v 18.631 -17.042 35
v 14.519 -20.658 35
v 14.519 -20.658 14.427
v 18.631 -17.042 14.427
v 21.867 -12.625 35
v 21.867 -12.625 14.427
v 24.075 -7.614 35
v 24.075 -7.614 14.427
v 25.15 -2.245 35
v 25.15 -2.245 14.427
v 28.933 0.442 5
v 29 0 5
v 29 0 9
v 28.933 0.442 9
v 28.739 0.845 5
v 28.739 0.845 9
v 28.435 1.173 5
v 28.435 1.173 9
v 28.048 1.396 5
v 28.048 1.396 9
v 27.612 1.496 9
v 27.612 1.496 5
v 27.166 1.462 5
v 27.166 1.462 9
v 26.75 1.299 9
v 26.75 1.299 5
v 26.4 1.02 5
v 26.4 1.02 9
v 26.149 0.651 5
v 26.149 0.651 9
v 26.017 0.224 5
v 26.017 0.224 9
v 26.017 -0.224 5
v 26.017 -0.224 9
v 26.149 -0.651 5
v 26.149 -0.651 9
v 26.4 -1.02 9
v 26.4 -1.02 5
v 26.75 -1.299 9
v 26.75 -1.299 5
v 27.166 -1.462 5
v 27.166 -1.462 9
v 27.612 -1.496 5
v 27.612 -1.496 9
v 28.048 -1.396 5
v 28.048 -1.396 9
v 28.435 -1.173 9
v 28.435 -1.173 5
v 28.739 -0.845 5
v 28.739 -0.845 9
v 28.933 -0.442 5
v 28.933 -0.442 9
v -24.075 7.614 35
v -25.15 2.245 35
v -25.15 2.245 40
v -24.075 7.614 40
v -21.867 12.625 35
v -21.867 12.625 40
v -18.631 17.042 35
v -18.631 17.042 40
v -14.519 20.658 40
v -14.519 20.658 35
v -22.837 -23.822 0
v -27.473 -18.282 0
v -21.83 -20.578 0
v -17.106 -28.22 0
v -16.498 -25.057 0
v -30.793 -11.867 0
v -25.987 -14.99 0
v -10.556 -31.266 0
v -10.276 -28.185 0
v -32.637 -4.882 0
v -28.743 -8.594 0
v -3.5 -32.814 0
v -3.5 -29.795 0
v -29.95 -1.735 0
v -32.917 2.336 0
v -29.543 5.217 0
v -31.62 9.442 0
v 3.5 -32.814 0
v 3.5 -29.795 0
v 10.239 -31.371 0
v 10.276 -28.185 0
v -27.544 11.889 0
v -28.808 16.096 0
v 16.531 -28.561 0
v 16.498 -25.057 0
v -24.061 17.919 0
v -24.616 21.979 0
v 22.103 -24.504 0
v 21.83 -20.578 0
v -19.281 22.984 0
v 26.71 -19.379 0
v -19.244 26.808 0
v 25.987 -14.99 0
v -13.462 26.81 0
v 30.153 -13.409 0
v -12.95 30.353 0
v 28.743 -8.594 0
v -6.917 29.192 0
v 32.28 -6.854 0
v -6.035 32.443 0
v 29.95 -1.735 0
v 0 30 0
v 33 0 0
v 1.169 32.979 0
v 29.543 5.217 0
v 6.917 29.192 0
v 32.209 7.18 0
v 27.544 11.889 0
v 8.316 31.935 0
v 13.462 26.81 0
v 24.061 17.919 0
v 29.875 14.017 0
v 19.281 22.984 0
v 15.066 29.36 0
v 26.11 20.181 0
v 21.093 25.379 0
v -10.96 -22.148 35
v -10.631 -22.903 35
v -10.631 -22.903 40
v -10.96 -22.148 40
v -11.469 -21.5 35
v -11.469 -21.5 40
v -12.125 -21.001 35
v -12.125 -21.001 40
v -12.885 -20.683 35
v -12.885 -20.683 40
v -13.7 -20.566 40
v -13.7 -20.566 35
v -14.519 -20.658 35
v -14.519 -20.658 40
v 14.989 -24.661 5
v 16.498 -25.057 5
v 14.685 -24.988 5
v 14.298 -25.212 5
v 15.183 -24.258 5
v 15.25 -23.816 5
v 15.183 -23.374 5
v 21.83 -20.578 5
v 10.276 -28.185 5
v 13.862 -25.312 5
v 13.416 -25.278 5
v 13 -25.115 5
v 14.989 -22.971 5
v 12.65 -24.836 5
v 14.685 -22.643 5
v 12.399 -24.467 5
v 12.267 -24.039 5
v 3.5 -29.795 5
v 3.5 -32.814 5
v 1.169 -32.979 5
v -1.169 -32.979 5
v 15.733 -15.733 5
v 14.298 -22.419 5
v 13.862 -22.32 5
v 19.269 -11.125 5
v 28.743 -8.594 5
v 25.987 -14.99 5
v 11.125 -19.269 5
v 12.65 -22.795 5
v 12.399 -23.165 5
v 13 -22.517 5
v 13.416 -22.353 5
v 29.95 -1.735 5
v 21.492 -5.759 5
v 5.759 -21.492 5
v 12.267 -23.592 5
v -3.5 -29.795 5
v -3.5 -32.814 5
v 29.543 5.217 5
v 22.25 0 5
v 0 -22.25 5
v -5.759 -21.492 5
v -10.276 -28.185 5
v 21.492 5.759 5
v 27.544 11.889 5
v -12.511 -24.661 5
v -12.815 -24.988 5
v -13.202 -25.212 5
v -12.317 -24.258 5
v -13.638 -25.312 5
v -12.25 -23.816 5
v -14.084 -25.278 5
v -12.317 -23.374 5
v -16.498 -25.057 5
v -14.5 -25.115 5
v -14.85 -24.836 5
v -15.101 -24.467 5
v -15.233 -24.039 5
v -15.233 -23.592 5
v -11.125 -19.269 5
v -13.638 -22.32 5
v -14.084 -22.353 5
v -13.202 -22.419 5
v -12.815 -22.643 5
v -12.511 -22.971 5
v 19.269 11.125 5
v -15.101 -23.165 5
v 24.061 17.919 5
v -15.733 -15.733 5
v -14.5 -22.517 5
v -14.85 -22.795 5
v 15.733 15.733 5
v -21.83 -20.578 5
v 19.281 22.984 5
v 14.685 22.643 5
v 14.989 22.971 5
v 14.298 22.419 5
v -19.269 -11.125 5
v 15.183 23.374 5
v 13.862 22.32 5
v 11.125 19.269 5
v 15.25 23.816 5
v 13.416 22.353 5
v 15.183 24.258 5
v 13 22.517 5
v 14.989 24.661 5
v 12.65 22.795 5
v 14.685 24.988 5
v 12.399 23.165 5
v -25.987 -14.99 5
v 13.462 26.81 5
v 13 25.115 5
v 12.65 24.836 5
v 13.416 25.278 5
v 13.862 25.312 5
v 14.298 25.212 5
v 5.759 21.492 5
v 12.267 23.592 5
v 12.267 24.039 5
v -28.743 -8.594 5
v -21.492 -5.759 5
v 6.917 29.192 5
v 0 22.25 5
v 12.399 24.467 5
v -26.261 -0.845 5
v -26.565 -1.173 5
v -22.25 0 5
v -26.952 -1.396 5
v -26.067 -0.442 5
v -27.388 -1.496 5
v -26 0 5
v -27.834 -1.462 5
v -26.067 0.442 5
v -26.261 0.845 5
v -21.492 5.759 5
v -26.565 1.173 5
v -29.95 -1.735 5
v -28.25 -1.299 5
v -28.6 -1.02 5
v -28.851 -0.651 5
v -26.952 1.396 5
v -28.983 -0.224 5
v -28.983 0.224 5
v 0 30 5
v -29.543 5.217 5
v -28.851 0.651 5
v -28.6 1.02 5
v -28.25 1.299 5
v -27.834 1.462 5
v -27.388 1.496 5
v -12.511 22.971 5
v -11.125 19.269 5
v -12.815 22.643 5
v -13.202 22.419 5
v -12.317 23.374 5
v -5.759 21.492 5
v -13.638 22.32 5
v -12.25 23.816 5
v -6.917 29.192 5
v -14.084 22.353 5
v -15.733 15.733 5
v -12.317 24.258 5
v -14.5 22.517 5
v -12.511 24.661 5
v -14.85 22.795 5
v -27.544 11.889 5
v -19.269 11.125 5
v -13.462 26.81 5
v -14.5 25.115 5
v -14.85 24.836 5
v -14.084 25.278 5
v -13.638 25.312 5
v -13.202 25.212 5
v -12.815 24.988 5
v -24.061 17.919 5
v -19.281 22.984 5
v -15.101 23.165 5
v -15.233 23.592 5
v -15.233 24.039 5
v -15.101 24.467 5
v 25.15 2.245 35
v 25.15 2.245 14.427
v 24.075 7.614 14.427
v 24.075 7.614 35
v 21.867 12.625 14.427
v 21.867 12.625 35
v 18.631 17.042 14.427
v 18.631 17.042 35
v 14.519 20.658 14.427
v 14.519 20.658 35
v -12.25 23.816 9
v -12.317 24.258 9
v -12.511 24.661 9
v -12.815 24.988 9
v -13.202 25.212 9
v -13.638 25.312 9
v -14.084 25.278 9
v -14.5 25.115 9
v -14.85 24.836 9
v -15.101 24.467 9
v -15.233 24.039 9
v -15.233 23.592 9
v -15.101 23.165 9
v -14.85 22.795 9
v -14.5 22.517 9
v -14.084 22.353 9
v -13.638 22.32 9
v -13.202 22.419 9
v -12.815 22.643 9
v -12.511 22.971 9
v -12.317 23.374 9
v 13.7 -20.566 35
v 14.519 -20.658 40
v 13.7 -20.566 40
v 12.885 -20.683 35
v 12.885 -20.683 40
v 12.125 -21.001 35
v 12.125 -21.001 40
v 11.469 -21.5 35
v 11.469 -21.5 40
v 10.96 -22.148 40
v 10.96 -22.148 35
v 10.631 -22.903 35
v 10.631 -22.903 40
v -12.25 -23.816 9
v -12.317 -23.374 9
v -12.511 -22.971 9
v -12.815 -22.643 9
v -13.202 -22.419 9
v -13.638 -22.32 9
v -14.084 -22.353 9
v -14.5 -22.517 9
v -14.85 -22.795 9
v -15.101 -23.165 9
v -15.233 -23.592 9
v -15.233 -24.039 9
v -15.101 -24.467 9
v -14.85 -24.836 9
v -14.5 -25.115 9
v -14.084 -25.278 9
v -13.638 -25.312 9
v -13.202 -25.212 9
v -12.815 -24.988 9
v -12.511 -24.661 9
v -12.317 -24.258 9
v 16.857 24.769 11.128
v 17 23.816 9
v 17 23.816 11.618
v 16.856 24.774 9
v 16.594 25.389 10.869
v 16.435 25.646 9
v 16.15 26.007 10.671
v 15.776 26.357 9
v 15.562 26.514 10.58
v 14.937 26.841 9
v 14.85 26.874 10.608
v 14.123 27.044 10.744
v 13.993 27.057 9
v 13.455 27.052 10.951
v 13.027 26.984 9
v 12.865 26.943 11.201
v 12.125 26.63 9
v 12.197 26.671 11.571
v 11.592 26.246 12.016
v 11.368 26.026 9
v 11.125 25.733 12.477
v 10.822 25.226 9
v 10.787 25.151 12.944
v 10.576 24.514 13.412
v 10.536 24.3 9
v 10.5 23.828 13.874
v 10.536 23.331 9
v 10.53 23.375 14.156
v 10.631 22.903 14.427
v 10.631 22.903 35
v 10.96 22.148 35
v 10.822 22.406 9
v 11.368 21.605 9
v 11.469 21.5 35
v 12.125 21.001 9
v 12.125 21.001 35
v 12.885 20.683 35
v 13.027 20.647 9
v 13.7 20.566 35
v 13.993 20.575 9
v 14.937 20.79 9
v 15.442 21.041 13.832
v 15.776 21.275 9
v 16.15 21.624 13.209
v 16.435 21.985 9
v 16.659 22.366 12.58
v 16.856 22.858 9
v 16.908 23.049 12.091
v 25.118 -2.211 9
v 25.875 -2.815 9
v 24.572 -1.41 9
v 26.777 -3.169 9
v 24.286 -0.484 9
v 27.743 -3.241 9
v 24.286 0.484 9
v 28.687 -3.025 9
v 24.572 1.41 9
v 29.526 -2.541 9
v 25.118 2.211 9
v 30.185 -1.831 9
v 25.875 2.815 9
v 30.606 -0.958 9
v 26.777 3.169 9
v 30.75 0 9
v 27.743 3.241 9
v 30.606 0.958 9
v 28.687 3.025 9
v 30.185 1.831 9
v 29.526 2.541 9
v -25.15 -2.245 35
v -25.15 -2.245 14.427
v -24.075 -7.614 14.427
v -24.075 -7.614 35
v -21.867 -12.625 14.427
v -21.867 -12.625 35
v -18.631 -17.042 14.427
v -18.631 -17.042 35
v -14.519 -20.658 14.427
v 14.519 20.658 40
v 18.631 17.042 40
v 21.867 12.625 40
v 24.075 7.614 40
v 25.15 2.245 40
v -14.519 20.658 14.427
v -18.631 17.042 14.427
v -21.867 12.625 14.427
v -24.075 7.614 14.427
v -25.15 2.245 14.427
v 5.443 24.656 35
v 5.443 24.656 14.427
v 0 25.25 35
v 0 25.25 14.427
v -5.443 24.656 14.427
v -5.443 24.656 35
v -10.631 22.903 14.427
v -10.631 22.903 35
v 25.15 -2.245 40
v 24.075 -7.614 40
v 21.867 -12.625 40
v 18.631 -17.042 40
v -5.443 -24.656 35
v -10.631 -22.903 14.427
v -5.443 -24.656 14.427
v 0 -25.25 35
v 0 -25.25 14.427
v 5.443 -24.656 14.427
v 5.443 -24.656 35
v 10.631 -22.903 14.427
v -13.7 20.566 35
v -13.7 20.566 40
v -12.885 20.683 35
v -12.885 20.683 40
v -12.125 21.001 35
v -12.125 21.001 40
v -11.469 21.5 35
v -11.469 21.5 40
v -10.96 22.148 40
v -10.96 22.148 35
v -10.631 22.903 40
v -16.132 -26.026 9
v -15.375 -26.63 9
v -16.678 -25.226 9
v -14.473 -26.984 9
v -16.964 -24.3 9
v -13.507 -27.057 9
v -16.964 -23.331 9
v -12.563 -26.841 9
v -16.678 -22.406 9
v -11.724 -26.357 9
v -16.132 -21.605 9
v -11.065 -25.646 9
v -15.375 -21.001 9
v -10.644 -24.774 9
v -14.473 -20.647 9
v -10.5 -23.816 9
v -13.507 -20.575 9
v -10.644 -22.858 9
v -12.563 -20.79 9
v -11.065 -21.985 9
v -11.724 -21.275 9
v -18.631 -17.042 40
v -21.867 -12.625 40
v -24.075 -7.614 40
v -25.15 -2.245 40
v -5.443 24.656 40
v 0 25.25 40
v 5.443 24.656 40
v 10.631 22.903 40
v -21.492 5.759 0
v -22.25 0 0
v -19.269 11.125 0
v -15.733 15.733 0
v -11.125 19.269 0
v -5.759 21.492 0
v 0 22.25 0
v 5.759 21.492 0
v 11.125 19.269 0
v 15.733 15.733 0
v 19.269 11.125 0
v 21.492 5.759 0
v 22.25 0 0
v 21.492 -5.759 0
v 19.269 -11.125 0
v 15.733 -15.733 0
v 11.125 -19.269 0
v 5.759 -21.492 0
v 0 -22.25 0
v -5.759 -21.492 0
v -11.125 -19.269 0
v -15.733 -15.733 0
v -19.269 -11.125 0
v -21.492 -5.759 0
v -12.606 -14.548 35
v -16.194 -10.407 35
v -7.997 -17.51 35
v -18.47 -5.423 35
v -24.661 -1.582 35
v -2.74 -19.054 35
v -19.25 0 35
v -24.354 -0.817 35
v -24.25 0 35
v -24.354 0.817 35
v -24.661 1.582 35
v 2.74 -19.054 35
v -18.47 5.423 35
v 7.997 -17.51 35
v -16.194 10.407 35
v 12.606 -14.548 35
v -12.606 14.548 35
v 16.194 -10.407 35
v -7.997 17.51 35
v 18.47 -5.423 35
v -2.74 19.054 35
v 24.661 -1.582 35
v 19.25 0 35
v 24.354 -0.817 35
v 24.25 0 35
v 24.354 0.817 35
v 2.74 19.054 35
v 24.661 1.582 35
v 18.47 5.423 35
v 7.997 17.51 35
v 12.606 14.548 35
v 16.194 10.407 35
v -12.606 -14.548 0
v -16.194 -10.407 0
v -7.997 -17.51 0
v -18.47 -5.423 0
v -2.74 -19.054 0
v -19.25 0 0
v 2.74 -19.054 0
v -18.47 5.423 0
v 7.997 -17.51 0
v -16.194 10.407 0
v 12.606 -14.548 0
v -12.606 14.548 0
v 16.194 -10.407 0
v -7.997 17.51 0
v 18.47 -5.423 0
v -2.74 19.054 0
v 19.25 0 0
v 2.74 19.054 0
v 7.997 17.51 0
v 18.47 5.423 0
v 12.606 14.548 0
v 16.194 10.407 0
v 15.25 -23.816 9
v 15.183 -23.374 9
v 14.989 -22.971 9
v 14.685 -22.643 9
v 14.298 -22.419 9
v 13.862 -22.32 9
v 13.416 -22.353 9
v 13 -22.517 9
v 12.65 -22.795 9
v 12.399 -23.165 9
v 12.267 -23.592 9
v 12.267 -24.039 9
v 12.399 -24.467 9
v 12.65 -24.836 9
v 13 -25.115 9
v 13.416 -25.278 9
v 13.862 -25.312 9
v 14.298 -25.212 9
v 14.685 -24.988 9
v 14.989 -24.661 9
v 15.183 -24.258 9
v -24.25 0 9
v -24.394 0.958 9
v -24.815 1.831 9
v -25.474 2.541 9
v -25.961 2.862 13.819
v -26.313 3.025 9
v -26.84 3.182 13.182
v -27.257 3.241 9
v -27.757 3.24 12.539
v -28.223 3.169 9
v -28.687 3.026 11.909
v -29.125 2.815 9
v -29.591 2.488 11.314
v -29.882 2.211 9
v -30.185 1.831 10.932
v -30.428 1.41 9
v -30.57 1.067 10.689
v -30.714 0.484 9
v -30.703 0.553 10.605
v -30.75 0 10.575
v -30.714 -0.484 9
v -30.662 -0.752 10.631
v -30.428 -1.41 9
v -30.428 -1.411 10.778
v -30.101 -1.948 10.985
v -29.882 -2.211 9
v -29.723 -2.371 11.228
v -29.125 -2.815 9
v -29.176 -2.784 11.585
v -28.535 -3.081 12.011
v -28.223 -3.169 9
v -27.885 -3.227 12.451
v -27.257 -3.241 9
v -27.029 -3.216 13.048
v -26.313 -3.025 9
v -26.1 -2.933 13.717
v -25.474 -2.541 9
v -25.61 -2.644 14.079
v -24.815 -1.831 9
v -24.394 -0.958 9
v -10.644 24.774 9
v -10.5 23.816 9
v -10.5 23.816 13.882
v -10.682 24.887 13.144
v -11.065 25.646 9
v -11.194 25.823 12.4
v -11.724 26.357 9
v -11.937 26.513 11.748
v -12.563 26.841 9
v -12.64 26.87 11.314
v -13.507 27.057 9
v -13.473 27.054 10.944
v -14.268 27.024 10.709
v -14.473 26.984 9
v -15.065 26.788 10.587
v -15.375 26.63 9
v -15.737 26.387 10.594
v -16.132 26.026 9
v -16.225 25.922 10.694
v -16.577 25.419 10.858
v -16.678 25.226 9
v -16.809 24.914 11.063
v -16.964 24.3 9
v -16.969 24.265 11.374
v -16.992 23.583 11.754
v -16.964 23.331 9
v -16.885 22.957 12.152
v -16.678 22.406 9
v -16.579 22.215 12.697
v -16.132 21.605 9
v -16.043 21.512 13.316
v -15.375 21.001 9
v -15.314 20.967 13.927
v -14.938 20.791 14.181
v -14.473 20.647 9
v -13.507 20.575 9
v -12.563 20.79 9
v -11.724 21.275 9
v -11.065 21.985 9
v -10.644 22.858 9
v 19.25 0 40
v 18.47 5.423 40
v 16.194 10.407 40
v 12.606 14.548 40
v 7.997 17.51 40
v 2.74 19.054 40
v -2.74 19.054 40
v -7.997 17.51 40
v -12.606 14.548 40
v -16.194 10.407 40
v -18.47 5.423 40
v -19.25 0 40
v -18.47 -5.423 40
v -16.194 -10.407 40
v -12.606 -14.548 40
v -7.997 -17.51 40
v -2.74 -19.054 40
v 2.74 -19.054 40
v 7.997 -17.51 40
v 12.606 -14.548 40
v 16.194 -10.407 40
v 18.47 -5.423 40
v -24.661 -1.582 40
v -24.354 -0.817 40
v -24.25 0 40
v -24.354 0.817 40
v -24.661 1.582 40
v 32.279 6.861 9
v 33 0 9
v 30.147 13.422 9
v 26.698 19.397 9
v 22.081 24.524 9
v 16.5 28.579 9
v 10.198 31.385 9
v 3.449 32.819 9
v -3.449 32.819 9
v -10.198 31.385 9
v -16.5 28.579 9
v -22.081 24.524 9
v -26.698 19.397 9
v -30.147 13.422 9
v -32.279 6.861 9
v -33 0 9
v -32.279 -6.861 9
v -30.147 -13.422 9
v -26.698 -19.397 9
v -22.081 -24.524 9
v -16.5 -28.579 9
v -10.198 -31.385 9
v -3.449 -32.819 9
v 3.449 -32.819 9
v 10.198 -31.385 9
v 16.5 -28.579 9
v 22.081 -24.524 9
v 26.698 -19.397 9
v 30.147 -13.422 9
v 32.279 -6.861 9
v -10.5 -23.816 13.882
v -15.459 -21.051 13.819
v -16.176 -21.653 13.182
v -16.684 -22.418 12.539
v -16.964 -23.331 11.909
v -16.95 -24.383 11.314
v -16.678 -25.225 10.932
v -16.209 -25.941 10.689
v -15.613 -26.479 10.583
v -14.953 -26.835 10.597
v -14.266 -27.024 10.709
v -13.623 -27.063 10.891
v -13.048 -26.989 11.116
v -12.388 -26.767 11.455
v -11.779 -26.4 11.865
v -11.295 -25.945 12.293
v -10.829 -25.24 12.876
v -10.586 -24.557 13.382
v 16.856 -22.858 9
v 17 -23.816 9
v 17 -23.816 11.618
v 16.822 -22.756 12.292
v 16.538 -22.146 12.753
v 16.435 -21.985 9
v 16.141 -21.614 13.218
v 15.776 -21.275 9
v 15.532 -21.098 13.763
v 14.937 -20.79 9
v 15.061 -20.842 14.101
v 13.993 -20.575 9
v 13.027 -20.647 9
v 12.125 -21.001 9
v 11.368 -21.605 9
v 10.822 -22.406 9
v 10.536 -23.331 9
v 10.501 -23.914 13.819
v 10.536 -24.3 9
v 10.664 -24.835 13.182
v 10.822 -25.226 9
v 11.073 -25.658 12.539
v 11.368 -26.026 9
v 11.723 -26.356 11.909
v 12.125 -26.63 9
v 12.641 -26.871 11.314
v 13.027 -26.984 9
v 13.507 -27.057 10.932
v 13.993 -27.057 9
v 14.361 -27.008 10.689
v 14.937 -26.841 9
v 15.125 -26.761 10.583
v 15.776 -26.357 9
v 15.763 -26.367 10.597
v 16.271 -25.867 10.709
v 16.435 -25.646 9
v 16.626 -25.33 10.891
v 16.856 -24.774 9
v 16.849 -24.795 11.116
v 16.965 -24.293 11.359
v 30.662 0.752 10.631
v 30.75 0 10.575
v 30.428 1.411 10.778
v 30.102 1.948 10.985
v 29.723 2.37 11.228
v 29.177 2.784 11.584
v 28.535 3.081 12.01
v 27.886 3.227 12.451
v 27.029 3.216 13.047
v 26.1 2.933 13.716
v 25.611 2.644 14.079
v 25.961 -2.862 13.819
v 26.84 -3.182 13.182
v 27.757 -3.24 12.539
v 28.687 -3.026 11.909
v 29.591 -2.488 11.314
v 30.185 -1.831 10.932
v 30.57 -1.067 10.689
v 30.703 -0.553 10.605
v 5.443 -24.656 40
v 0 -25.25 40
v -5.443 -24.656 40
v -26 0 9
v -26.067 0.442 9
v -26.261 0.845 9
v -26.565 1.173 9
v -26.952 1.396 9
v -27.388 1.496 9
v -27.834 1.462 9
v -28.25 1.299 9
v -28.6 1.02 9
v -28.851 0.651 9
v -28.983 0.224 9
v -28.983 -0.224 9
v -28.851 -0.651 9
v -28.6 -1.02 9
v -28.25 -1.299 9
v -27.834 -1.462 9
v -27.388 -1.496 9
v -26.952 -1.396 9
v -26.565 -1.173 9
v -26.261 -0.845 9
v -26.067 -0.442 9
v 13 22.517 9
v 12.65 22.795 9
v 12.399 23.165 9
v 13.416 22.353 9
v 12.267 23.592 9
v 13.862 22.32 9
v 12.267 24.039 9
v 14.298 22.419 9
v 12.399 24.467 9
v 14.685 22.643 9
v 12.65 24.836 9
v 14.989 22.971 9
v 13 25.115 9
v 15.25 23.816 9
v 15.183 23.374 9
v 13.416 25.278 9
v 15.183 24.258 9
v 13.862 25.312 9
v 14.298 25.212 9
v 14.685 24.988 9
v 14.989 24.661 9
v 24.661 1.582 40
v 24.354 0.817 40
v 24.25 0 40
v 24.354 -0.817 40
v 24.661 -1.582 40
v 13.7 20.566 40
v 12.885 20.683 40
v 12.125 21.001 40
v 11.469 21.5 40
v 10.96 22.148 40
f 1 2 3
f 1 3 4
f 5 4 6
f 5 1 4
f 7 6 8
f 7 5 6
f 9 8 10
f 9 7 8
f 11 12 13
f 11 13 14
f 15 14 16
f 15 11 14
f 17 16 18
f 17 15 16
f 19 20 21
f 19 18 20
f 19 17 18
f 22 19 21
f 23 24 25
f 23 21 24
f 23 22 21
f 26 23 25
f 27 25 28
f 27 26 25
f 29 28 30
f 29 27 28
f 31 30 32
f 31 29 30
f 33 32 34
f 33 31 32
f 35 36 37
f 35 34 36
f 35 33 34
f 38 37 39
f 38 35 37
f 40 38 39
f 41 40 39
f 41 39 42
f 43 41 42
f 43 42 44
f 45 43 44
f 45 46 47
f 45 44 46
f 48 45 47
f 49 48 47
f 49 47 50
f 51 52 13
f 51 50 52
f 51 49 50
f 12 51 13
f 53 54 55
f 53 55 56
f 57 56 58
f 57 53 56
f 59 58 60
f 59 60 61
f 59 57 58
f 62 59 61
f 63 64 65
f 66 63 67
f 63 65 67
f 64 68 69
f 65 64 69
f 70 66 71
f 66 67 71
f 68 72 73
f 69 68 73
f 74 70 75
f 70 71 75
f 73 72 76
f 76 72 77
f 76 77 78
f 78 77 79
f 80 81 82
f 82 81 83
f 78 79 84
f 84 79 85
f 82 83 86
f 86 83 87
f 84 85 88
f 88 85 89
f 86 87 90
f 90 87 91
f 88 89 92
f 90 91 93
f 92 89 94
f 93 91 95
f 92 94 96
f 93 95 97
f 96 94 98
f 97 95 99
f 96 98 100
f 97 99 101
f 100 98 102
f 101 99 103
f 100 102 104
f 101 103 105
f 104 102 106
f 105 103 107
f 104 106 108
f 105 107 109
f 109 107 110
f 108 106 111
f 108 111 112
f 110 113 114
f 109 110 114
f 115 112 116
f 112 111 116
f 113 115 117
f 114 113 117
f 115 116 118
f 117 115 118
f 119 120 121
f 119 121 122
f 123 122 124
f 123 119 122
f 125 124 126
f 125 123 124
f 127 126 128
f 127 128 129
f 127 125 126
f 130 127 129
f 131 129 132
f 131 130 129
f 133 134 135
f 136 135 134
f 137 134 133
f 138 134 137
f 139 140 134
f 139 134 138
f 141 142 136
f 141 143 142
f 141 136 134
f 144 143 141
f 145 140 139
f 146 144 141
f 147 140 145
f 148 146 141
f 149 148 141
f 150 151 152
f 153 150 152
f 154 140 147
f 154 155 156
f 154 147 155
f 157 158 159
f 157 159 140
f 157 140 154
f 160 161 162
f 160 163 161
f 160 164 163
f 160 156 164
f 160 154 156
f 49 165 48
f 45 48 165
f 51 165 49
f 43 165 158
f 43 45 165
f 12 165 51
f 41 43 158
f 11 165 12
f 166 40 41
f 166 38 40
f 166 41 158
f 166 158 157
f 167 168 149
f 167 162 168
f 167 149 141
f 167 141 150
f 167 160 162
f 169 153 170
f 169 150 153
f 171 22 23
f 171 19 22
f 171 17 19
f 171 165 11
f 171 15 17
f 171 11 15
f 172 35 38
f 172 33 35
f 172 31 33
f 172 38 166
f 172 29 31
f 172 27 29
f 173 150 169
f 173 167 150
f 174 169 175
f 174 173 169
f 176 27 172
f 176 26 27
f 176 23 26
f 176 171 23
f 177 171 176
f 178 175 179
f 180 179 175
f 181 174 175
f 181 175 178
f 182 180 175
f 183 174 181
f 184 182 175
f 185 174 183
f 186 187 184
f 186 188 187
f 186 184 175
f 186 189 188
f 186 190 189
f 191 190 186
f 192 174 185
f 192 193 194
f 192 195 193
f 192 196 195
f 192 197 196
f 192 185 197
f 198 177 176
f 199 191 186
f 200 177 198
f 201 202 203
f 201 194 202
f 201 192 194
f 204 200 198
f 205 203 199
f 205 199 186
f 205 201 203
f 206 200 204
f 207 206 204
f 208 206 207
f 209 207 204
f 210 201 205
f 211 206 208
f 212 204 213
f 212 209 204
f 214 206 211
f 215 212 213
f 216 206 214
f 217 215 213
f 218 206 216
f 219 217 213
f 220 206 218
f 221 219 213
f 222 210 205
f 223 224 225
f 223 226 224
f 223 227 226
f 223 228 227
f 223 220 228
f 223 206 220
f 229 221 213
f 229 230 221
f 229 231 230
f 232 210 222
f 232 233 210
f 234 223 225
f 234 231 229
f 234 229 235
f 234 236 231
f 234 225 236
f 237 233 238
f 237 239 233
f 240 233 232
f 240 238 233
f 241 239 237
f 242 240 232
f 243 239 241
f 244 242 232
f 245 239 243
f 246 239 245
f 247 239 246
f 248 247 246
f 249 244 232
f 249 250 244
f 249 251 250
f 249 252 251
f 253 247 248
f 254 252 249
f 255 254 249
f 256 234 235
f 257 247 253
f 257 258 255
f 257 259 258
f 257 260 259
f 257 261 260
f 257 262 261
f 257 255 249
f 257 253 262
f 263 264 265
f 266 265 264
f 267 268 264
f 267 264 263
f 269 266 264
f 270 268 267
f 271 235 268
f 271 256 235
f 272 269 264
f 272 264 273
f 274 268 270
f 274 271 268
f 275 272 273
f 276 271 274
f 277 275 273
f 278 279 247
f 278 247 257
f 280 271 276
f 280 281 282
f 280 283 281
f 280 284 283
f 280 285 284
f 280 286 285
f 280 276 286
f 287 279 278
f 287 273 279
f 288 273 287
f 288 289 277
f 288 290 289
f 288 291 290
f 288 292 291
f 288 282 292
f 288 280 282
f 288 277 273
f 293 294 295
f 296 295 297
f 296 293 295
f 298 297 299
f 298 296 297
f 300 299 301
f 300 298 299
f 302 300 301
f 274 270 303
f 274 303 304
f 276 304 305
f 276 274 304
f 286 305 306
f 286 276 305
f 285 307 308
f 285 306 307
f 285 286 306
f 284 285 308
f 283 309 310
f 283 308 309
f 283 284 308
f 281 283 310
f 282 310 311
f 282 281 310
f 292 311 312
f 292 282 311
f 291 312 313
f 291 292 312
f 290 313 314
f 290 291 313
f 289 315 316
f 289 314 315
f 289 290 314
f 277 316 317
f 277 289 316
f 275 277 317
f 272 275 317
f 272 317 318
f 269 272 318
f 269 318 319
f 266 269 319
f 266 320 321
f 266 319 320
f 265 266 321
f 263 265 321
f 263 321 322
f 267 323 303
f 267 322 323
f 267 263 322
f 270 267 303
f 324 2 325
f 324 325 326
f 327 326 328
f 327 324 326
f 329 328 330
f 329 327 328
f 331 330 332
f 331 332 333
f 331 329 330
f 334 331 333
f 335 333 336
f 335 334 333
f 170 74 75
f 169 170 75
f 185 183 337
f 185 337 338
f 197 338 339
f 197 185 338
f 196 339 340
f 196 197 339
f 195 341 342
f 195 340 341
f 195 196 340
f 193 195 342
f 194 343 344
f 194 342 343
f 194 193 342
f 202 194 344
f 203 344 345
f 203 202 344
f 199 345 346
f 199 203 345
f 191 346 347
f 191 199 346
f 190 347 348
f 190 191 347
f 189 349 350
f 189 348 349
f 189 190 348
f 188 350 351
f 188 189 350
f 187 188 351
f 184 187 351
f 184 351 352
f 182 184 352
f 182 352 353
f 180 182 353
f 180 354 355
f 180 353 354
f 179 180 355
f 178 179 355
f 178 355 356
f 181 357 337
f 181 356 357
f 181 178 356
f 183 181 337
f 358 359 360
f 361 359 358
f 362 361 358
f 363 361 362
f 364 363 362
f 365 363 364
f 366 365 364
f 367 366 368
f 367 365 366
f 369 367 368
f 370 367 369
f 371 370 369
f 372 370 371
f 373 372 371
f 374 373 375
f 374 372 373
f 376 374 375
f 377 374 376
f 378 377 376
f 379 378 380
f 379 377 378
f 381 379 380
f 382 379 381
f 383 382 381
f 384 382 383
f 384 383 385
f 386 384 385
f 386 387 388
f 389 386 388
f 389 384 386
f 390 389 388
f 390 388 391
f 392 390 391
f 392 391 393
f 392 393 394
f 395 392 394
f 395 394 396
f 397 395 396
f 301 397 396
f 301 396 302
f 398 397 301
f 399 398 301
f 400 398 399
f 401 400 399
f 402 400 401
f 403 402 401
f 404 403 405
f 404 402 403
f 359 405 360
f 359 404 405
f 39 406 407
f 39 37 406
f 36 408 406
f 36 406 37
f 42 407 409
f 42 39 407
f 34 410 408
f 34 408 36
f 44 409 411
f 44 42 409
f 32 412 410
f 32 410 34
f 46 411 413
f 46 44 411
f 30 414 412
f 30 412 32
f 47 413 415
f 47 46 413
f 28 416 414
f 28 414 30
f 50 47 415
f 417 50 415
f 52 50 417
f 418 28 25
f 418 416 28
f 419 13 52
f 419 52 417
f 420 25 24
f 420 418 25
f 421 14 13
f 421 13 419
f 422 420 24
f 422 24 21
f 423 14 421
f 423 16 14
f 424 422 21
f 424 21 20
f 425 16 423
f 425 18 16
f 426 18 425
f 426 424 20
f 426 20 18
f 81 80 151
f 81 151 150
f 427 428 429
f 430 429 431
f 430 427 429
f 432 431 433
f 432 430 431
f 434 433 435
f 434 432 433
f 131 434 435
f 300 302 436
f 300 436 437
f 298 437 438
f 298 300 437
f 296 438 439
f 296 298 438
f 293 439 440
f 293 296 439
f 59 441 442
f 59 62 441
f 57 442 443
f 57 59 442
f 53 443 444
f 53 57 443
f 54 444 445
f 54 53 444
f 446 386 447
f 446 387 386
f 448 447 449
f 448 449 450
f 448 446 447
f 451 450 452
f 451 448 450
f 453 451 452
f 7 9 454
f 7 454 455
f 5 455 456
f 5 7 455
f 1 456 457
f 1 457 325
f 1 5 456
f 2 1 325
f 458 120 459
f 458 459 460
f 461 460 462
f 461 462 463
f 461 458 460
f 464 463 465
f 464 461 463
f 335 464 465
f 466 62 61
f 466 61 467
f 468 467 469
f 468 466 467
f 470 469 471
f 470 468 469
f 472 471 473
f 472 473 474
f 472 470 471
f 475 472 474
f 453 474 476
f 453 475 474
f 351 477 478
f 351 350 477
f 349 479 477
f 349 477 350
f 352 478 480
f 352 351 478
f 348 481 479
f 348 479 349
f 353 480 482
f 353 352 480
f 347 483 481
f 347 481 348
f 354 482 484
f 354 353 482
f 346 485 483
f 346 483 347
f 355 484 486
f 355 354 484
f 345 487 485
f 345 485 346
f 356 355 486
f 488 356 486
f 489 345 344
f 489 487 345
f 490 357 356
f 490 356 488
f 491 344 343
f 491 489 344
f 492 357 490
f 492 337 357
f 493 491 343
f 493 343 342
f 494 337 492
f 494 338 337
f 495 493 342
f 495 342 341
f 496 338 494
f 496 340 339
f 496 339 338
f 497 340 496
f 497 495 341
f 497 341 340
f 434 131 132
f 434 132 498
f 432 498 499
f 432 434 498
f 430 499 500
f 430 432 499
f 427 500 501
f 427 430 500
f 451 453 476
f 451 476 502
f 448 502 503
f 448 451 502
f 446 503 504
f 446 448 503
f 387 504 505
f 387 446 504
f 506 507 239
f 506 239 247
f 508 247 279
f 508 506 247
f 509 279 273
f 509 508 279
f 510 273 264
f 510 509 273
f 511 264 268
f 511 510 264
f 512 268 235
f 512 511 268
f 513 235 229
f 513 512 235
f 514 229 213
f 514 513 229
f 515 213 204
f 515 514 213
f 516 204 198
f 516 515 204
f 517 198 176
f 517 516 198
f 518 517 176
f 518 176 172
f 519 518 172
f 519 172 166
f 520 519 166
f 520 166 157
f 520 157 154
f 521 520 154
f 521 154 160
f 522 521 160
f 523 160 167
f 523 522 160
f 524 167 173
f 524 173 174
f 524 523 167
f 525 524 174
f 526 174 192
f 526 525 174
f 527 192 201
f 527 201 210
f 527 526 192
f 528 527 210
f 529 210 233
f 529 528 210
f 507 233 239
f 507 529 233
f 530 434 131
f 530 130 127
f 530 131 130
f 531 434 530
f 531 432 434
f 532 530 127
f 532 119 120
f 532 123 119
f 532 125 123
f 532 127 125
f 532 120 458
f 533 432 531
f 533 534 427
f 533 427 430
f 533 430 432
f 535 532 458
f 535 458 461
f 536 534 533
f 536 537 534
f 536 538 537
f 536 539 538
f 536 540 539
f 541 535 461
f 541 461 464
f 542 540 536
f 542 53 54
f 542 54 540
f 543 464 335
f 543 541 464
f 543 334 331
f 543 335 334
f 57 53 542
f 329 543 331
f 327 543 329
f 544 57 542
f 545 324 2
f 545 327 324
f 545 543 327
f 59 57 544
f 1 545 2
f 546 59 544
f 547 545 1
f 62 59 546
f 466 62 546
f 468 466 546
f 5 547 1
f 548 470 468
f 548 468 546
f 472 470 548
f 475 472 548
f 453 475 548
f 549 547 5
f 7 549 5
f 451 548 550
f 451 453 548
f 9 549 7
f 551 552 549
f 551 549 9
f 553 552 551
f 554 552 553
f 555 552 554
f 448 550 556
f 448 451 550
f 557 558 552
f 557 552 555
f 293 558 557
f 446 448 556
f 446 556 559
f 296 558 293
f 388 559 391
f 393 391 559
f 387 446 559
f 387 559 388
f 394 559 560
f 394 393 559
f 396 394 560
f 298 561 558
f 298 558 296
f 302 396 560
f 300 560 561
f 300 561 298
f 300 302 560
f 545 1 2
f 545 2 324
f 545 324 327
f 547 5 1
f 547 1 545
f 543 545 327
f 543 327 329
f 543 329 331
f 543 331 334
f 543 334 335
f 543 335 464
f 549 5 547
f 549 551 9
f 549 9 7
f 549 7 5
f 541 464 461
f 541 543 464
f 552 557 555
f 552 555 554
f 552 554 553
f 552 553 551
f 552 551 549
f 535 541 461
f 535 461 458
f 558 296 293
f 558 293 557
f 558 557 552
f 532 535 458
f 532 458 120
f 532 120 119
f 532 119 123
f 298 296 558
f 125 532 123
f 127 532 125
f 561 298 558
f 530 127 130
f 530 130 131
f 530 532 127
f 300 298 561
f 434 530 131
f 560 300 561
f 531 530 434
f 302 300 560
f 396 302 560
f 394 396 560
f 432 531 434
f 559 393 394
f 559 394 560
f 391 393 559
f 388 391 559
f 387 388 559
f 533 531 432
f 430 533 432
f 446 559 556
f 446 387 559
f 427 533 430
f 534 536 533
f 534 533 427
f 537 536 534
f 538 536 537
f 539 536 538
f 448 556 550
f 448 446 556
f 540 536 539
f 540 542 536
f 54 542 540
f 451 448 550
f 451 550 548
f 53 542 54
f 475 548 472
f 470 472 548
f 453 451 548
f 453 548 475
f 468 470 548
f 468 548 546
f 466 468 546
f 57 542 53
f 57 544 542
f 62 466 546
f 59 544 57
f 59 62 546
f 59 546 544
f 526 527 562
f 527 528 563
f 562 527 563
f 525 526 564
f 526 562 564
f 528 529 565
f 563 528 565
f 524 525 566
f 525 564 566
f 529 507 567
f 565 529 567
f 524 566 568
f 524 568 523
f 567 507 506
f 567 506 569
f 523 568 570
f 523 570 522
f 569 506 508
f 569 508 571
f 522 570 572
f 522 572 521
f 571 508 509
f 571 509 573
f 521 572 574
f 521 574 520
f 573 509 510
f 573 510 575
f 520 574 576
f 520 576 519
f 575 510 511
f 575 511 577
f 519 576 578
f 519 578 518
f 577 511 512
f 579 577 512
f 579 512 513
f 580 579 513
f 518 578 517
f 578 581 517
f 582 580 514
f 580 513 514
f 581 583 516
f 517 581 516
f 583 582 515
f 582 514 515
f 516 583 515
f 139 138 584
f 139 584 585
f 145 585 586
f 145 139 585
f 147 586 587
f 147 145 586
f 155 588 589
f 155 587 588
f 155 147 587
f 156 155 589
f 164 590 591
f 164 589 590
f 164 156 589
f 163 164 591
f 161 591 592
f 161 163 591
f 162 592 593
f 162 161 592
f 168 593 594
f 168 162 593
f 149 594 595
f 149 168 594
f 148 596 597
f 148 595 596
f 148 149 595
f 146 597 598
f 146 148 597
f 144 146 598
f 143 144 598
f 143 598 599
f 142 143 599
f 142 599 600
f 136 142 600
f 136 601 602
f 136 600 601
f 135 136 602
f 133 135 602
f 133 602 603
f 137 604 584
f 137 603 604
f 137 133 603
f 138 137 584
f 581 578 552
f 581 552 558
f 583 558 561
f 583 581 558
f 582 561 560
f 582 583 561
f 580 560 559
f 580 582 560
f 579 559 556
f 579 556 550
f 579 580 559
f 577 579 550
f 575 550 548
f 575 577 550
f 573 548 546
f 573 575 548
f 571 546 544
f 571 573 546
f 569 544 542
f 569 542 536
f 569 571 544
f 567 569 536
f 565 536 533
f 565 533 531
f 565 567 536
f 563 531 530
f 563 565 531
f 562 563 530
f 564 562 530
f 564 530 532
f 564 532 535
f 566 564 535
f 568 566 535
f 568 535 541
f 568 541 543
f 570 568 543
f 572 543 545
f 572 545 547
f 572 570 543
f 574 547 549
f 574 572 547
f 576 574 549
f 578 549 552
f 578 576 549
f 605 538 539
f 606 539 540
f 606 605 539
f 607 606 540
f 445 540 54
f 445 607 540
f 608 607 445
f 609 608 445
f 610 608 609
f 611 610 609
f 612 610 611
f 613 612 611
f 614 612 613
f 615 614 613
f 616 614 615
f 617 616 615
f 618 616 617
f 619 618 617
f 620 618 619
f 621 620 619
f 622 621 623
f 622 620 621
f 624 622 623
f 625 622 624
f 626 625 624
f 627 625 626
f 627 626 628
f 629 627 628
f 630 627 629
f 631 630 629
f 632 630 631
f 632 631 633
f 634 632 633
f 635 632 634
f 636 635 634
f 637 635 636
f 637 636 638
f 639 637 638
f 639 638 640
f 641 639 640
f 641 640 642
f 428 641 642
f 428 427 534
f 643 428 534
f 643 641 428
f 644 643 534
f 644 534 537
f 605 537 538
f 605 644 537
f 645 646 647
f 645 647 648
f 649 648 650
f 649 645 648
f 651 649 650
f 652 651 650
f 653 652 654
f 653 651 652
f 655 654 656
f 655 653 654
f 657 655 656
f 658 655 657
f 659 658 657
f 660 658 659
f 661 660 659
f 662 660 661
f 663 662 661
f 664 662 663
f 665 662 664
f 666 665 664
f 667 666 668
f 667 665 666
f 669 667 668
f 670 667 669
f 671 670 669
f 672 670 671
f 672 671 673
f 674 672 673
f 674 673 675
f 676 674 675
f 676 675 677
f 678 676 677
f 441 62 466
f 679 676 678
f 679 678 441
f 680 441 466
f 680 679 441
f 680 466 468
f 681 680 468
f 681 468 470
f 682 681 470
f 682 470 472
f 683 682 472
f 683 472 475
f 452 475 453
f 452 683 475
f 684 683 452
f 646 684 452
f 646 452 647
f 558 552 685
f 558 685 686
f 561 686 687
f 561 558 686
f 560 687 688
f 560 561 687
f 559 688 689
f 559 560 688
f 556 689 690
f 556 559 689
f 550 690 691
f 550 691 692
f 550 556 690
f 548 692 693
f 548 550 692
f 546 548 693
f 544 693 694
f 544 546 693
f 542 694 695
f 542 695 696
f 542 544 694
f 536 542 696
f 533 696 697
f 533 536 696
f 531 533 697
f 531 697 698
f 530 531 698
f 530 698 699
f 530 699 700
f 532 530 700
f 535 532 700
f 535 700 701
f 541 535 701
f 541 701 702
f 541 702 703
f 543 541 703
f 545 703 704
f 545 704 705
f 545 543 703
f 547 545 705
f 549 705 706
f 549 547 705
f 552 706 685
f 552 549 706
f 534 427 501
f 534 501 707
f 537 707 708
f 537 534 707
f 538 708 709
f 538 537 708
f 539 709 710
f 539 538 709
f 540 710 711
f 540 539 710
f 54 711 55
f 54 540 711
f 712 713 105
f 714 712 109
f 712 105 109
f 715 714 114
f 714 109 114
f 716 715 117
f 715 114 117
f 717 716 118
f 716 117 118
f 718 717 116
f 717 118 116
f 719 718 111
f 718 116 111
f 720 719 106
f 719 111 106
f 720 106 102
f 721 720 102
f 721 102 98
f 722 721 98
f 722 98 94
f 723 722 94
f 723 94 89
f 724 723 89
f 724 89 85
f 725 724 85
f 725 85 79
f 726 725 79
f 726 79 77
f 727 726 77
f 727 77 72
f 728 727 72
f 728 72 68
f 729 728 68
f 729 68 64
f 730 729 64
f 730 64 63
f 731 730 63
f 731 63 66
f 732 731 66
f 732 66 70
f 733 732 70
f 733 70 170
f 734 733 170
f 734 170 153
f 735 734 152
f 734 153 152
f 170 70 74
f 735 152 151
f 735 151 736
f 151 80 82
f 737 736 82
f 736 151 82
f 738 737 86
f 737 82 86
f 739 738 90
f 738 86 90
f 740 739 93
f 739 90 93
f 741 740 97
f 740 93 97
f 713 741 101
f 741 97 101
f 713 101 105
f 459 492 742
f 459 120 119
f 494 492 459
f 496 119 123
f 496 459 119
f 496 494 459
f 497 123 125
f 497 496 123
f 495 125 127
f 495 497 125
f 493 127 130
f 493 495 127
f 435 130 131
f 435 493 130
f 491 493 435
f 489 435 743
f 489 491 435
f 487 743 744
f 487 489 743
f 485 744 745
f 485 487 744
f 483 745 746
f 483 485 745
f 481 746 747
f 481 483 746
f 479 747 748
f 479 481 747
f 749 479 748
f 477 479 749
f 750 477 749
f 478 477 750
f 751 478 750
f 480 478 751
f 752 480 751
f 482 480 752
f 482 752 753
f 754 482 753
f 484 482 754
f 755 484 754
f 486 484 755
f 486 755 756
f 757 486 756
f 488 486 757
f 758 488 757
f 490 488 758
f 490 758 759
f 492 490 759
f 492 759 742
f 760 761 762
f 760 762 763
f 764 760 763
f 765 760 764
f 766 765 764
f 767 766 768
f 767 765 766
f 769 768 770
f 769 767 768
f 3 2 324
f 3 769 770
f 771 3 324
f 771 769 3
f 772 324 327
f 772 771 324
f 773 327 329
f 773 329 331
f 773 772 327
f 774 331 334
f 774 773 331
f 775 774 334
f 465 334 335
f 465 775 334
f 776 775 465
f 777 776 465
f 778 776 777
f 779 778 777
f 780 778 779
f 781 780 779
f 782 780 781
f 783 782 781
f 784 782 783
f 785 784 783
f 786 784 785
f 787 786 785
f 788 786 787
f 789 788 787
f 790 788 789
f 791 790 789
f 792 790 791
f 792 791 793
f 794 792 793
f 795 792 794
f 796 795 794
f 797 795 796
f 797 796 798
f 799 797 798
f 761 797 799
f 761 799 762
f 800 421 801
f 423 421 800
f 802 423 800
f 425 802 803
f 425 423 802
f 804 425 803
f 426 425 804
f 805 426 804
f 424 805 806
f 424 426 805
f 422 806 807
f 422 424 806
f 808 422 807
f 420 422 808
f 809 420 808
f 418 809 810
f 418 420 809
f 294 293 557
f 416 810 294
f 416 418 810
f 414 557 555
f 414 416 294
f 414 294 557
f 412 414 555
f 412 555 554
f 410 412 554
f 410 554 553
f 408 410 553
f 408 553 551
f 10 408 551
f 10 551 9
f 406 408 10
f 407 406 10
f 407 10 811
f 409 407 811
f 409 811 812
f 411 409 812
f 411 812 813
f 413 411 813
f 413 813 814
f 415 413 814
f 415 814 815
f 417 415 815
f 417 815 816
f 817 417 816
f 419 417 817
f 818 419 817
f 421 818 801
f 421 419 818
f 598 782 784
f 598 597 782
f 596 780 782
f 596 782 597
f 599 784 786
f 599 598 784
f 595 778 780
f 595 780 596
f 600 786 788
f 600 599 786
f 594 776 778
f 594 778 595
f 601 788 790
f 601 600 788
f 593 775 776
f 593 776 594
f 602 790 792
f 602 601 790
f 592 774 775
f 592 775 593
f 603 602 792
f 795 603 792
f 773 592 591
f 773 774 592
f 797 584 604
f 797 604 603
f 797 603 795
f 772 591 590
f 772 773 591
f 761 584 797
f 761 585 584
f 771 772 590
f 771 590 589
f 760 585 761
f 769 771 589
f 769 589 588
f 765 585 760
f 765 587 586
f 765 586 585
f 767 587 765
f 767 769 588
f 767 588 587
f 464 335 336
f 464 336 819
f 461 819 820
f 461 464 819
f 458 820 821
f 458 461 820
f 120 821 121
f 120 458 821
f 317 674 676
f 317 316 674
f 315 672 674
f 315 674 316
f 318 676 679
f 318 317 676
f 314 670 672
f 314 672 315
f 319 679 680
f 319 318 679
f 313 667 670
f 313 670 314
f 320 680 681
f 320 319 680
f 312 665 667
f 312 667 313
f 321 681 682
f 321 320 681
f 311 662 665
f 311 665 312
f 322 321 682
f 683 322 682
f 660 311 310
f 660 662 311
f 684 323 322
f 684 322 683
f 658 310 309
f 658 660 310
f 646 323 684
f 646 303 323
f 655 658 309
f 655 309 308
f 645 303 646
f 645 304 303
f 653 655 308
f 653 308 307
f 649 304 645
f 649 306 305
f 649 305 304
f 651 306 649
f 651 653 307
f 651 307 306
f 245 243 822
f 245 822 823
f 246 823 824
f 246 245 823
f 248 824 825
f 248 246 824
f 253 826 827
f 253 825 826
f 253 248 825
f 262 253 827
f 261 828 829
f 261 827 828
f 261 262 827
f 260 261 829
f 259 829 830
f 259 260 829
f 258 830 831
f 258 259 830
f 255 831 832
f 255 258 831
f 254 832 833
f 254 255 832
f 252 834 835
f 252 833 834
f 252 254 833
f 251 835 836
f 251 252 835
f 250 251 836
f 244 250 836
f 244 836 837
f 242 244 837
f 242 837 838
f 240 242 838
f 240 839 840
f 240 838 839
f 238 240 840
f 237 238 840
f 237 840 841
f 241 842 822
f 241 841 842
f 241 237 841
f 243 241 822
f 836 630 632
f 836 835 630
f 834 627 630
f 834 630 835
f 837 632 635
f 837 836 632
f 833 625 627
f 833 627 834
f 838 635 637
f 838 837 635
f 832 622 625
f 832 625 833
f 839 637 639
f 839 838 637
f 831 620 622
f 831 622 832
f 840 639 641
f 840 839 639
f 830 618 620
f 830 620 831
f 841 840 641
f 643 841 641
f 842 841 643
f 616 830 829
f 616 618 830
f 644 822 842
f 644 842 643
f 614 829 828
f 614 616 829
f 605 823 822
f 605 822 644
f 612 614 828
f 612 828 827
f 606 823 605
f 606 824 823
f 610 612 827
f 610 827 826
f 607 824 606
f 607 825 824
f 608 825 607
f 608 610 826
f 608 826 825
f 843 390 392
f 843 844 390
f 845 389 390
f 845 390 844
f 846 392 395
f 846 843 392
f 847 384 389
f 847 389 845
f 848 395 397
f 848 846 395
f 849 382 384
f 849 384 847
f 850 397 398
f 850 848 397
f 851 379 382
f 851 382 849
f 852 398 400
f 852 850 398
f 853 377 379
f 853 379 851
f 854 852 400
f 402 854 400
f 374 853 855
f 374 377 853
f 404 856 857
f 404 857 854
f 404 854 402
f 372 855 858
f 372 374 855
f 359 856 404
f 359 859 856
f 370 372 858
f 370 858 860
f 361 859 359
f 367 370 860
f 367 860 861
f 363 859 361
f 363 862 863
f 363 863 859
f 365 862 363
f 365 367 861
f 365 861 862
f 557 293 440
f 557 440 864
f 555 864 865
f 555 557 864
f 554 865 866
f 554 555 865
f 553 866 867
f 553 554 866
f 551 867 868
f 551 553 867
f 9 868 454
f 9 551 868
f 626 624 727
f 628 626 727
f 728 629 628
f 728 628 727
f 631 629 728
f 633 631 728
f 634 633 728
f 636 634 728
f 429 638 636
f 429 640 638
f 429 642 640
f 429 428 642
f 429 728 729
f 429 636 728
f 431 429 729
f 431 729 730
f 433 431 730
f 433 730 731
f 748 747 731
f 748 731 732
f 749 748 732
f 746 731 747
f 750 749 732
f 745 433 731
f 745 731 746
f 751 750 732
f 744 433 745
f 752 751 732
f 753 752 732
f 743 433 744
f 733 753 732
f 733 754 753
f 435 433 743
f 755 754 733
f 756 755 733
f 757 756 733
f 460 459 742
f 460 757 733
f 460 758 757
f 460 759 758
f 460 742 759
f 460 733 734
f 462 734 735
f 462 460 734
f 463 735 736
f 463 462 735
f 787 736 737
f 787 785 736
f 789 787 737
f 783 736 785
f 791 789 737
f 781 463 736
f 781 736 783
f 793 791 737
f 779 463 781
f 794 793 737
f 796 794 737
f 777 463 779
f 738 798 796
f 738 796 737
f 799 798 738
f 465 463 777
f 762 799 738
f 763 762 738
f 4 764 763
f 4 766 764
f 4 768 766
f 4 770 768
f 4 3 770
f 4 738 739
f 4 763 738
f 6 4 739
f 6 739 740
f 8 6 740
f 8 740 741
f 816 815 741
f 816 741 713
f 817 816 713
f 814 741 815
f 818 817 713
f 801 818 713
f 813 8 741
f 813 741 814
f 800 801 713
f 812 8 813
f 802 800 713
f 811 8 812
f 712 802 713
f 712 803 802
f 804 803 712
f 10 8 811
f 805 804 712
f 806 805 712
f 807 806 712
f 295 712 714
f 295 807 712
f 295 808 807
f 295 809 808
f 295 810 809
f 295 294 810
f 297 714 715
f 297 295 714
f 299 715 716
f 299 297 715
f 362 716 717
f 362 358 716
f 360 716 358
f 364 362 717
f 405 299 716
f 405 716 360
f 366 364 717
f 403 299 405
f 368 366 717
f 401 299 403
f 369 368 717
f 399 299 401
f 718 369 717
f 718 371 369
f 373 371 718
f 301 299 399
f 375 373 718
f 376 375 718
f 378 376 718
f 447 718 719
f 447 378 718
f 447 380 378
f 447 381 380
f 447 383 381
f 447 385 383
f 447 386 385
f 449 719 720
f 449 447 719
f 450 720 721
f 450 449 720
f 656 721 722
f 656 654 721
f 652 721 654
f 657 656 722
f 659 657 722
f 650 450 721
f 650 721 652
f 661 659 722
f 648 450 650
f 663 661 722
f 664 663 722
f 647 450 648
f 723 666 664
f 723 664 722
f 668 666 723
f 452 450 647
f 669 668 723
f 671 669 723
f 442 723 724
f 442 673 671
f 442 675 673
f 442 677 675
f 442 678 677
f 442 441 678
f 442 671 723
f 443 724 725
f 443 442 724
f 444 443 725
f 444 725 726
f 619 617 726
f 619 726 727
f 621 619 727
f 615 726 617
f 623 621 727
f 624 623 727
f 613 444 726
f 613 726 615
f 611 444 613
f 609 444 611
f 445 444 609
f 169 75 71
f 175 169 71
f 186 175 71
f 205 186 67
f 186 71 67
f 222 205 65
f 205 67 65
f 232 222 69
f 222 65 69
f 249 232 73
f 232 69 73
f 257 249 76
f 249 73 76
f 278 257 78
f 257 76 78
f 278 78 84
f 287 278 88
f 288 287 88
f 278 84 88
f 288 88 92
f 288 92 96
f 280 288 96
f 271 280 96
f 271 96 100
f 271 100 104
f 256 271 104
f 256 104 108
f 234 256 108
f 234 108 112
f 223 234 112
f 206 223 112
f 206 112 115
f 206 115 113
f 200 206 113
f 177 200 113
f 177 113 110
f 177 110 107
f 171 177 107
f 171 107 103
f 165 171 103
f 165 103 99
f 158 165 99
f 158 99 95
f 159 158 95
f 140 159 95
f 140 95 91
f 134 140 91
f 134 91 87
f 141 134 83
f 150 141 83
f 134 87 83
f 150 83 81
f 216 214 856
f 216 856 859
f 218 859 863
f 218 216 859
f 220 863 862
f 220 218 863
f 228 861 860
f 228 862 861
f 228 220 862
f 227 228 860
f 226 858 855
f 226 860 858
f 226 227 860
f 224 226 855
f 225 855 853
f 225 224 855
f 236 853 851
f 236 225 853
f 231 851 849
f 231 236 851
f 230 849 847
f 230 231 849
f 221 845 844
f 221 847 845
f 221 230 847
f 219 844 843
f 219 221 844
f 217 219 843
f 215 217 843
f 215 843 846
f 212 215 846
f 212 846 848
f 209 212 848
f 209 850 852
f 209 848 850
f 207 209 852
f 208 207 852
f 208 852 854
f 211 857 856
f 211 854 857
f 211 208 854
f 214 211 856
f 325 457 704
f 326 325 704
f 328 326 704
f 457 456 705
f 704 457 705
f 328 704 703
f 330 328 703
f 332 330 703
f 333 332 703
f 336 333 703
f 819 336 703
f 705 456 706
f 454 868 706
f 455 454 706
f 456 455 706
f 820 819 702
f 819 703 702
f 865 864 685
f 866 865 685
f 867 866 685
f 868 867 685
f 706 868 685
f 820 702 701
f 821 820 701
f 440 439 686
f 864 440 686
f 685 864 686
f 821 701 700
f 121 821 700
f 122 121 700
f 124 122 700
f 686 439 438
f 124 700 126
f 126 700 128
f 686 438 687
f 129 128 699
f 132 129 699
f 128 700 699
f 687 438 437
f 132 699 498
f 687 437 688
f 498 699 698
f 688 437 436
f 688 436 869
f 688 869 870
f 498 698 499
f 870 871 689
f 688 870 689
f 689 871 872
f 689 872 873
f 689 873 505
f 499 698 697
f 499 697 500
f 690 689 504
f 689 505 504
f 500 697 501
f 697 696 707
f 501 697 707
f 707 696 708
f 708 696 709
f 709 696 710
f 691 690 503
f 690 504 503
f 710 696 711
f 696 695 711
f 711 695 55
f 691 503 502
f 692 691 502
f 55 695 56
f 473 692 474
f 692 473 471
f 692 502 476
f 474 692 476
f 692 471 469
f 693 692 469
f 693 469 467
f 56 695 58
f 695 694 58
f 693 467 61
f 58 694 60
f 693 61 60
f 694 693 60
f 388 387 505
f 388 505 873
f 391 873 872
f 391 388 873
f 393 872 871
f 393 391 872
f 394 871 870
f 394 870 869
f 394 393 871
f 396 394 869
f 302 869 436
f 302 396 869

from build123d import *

# Parameters (mm, degrees)
SKETCH1_R           = 33
SKETCH1_R_2         = 19.25
SKETCH1_R_3         = 1.5
BOSS_EXTRUDE1_DEPTH = 35
SKETCH4_R           = 30
SKETCH4_R_2         = 22.25
CUT_EXTRUDE1_DEPTH  = 5
CUT_EXTRUDE2_START  = -26
SKETCH5_R           = 3.25
SKETCH5_R_2         = 1.5
CUT_EXTRUDE2_DEPTH  = 26
SKETCH7_R           = 19.25
SHIM_FEATURE_DEPTH  = 5
SKETCH9_W           = 7
SKETCH9_H           = 6.869534375
CUT_EXTRUDE5_DEPTH  = 5


with BuildPart() as part:
    # Sketch1 → Boss-Extrude1 (new body)
    with BuildSketch(Plane.XY):
        Circle(SKETCH1_R)
        Circle(SKETCH1_R_2, mode=Mode.SUBTRACT)
        with Locations((-27.5, 0)):
            Circle(SKETCH1_R_3, mode=Mode.SUBTRACT)
        with Locations((-13.75, 23.815698604)):
            Circle(SKETCH1_R_3, mode=Mode.SUBTRACT)
        with Locations((13.75, 23.815698604)):
            Circle(SKETCH1_R_3, mode=Mode.SUBTRACT)
        with Locations((27.5, 0)):
            Circle(SKETCH1_R_3, mode=Mode.SUBTRACT)
        with Locations((13.75, -23.815698604)):
            Circle(SKETCH1_R_3, mode=Mode.SUBTRACT)
        with Locations((-13.75, -23.815698604)):
            Circle(SKETCH1_R_3, mode=Mode.SUBTRACT)
    extrude(amount=BOSS_EXTRUDE1_DEPTH)

    # Sketch6 → Cut-Revolve1 (revolve, cut)
    with BuildSketch(Plane(origin=(0, 0, 0), x_dir=(0, 0, -1), z_dir=(1, 0, 0)), mode=Mode.PRIVATE) as cut_revolve1_sk:
        Polygon((-35, 33), (-9, 33), (-14.426608421, 25.25), (-35, 25.25), align=None)
    revolve(cut_revolve1_sk.sketch.rotate(Axis((0, 0, 0), (0, 0, 1)), 90), axis=Axis((0, 0, 0), (0, 0, 1)), mode=Mode.SUBTRACT)

    # Sketch4 → Cut-Extrude1 (cut)
    with BuildSketch(Plane(origin=(0, 0, 0), x_dir=(-1, 0, 0), z_dir=(0, 0, -1))):
        Circle(SKETCH4_R)
        Circle(SKETCH4_R_2, mode=Mode.SUBTRACT)
    extrude(amount=-CUT_EXTRUDE1_DEPTH, mode=Mode.SUBTRACT)

    # Sketch5 → Cut-Extrude2 (cut)
    # profile 1 of 6: a face of its own
    with BuildSketch(Plane.XY.offset(35).offset(CUT_EXTRUDE2_START)):
        with Locations((-13.75, 23.815698604)):
            Circle(SKETCH5_R)
        with Locations(Location((-13.75, 23.815698604, 0), (0, 0, 180))):
            Circle(SKETCH5_R_2, mode=Mode.SUBTRACT)
    # profile 2 of 6: a face of its own
    with BuildSketch(Plane.XY.offset(35).offset(CUT_EXTRUDE2_START)):
        with Locations((-27.5, 0)):
            Circle(SKETCH5_R)
        with Locations(Location((-27.5, 0, 0), (0, 0, 180))):
            Circle(SKETCH5_R_2, mode=Mode.SUBTRACT)
    # profile 3 of 6: a face of its own
    with BuildSketch(Plane.XY.offset(35).offset(CUT_EXTRUDE2_START)):
        with Locations((-13.75, -23.815698604)):
            Circle(SKETCH5_R)
        with Locations(Location((-13.75, -23.815698604, 0), (0, 0, 180))):
            Circle(SKETCH5_R_2, mode=Mode.SUBTRACT)
    # profile 4 of 6: a face of its own
    with BuildSketch(Plane.XY.offset(35).offset(CUT_EXTRUDE2_START)):
        with Locations((13.75, -23.815698604)):
            Circle(SKETCH5_R)
        with Locations(Location((13.75, -23.815698604, 0), (0, 0, 180))):
            Circle(SKETCH5_R_2, mode=Mode.SUBTRACT)
    # profile 5 of 6: a face of its own
    with BuildSketch(Plane.XY.offset(35).offset(CUT_EXTRUDE2_START)):
        with Locations((27.5, 0)):
            Circle(SKETCH5_R)
        with Locations(Location((27.5, 0, 0), (0, 0, 180))):
            Circle(SKETCH5_R_2, mode=Mode.SUBTRACT)
    # profile 6 of 6: a face of its own
    with BuildSketch(Plane.XY.offset(35).offset(CUT_EXTRUDE2_START)):
        with Locations((13.75, 23.815698604)):
            Circle(SKETCH5_R)
        with Locations(Location((13.75, 23.815698604, 0), (0, 0, 180))):
            Circle(SKETCH5_R_2, mode=Mode.SUBTRACT)
    extrude(amount=CUT_EXTRUDE2_DEPTH, mode=Mode.SUBTRACT)

    # Sketch9 → Cut-Extrude5 (cut)
    with BuildSketch(Plane(origin=(0, 0, 0), x_dir=(-1, 0, 0), z_dir=(0, 0, -1))):
        with Locations((0, -29.565232812)):
            Rectangle(SKETCH9_W, SKETCH9_H)
    extrude(amount=-CUT_EXTRUDE5_DEPTH, mode=Mode.SUBTRACT)


with BuildPart() as body_2:
    # Sketch7 → Shim-Feature (new body)
    with BuildSketch(Plane.XY.offset(35)):
        with BuildLine():
            ThreePointArc((10.63077779, 22.903036121), (12.125, 21.001116042), (14.51922221, 20.658041689))
            ThreePointArc((14.51922221, 20.658041689), (21.867141446, 12.625), (25.15, 2.244994432))
            ThreePointArc((25.15, 2.244994432), (24.25, 0), (25.15, -2.244994432))
            ThreePointArc((25.15, -2.244994432), (21.867141446, -12.625), (14.51922221, -20.658041689))
            ThreePointArc((14.51922221, -20.658041689), (12.125, -21.001116042), (10.63077779, -22.903036121))
            ThreePointArc((10.63077779, -22.903036121), (0, -25.25), (-10.63077779, -22.903036121))
            ThreePointArc((-10.63077779, -22.903036121), (-12.125, -21.001116042), (-14.51922221, -20.658041689))
            ThreePointArc((-14.51922221, -20.658041689), (-21.867141446, -12.625), (-25.15, -2.244994432))
            ThreePointArc((-25.15, -2.244994432), (-24.25, 0), (-25.15, 2.244994432))
            ThreePointArc((-25.15, 2.244994432), (-21.867141446, 12.625), (-14.51922221, 20.658041689))
            ThreePointArc((-14.51922221, 20.658041689), (-12.125, 21.001116042), (-10.63077779, 22.903036121))
            ThreePointArc((-10.63077779, 22.903036121), (0, 25.25), (10.63077779, 22.903036121))
        make_face()
        Circle(SKETCH7_R, mode=Mode.SUBTRACT)
    extrude(amount=SHIM_FEATURE_DEPTH)


solid = Compound([part.part, body_2.part])
